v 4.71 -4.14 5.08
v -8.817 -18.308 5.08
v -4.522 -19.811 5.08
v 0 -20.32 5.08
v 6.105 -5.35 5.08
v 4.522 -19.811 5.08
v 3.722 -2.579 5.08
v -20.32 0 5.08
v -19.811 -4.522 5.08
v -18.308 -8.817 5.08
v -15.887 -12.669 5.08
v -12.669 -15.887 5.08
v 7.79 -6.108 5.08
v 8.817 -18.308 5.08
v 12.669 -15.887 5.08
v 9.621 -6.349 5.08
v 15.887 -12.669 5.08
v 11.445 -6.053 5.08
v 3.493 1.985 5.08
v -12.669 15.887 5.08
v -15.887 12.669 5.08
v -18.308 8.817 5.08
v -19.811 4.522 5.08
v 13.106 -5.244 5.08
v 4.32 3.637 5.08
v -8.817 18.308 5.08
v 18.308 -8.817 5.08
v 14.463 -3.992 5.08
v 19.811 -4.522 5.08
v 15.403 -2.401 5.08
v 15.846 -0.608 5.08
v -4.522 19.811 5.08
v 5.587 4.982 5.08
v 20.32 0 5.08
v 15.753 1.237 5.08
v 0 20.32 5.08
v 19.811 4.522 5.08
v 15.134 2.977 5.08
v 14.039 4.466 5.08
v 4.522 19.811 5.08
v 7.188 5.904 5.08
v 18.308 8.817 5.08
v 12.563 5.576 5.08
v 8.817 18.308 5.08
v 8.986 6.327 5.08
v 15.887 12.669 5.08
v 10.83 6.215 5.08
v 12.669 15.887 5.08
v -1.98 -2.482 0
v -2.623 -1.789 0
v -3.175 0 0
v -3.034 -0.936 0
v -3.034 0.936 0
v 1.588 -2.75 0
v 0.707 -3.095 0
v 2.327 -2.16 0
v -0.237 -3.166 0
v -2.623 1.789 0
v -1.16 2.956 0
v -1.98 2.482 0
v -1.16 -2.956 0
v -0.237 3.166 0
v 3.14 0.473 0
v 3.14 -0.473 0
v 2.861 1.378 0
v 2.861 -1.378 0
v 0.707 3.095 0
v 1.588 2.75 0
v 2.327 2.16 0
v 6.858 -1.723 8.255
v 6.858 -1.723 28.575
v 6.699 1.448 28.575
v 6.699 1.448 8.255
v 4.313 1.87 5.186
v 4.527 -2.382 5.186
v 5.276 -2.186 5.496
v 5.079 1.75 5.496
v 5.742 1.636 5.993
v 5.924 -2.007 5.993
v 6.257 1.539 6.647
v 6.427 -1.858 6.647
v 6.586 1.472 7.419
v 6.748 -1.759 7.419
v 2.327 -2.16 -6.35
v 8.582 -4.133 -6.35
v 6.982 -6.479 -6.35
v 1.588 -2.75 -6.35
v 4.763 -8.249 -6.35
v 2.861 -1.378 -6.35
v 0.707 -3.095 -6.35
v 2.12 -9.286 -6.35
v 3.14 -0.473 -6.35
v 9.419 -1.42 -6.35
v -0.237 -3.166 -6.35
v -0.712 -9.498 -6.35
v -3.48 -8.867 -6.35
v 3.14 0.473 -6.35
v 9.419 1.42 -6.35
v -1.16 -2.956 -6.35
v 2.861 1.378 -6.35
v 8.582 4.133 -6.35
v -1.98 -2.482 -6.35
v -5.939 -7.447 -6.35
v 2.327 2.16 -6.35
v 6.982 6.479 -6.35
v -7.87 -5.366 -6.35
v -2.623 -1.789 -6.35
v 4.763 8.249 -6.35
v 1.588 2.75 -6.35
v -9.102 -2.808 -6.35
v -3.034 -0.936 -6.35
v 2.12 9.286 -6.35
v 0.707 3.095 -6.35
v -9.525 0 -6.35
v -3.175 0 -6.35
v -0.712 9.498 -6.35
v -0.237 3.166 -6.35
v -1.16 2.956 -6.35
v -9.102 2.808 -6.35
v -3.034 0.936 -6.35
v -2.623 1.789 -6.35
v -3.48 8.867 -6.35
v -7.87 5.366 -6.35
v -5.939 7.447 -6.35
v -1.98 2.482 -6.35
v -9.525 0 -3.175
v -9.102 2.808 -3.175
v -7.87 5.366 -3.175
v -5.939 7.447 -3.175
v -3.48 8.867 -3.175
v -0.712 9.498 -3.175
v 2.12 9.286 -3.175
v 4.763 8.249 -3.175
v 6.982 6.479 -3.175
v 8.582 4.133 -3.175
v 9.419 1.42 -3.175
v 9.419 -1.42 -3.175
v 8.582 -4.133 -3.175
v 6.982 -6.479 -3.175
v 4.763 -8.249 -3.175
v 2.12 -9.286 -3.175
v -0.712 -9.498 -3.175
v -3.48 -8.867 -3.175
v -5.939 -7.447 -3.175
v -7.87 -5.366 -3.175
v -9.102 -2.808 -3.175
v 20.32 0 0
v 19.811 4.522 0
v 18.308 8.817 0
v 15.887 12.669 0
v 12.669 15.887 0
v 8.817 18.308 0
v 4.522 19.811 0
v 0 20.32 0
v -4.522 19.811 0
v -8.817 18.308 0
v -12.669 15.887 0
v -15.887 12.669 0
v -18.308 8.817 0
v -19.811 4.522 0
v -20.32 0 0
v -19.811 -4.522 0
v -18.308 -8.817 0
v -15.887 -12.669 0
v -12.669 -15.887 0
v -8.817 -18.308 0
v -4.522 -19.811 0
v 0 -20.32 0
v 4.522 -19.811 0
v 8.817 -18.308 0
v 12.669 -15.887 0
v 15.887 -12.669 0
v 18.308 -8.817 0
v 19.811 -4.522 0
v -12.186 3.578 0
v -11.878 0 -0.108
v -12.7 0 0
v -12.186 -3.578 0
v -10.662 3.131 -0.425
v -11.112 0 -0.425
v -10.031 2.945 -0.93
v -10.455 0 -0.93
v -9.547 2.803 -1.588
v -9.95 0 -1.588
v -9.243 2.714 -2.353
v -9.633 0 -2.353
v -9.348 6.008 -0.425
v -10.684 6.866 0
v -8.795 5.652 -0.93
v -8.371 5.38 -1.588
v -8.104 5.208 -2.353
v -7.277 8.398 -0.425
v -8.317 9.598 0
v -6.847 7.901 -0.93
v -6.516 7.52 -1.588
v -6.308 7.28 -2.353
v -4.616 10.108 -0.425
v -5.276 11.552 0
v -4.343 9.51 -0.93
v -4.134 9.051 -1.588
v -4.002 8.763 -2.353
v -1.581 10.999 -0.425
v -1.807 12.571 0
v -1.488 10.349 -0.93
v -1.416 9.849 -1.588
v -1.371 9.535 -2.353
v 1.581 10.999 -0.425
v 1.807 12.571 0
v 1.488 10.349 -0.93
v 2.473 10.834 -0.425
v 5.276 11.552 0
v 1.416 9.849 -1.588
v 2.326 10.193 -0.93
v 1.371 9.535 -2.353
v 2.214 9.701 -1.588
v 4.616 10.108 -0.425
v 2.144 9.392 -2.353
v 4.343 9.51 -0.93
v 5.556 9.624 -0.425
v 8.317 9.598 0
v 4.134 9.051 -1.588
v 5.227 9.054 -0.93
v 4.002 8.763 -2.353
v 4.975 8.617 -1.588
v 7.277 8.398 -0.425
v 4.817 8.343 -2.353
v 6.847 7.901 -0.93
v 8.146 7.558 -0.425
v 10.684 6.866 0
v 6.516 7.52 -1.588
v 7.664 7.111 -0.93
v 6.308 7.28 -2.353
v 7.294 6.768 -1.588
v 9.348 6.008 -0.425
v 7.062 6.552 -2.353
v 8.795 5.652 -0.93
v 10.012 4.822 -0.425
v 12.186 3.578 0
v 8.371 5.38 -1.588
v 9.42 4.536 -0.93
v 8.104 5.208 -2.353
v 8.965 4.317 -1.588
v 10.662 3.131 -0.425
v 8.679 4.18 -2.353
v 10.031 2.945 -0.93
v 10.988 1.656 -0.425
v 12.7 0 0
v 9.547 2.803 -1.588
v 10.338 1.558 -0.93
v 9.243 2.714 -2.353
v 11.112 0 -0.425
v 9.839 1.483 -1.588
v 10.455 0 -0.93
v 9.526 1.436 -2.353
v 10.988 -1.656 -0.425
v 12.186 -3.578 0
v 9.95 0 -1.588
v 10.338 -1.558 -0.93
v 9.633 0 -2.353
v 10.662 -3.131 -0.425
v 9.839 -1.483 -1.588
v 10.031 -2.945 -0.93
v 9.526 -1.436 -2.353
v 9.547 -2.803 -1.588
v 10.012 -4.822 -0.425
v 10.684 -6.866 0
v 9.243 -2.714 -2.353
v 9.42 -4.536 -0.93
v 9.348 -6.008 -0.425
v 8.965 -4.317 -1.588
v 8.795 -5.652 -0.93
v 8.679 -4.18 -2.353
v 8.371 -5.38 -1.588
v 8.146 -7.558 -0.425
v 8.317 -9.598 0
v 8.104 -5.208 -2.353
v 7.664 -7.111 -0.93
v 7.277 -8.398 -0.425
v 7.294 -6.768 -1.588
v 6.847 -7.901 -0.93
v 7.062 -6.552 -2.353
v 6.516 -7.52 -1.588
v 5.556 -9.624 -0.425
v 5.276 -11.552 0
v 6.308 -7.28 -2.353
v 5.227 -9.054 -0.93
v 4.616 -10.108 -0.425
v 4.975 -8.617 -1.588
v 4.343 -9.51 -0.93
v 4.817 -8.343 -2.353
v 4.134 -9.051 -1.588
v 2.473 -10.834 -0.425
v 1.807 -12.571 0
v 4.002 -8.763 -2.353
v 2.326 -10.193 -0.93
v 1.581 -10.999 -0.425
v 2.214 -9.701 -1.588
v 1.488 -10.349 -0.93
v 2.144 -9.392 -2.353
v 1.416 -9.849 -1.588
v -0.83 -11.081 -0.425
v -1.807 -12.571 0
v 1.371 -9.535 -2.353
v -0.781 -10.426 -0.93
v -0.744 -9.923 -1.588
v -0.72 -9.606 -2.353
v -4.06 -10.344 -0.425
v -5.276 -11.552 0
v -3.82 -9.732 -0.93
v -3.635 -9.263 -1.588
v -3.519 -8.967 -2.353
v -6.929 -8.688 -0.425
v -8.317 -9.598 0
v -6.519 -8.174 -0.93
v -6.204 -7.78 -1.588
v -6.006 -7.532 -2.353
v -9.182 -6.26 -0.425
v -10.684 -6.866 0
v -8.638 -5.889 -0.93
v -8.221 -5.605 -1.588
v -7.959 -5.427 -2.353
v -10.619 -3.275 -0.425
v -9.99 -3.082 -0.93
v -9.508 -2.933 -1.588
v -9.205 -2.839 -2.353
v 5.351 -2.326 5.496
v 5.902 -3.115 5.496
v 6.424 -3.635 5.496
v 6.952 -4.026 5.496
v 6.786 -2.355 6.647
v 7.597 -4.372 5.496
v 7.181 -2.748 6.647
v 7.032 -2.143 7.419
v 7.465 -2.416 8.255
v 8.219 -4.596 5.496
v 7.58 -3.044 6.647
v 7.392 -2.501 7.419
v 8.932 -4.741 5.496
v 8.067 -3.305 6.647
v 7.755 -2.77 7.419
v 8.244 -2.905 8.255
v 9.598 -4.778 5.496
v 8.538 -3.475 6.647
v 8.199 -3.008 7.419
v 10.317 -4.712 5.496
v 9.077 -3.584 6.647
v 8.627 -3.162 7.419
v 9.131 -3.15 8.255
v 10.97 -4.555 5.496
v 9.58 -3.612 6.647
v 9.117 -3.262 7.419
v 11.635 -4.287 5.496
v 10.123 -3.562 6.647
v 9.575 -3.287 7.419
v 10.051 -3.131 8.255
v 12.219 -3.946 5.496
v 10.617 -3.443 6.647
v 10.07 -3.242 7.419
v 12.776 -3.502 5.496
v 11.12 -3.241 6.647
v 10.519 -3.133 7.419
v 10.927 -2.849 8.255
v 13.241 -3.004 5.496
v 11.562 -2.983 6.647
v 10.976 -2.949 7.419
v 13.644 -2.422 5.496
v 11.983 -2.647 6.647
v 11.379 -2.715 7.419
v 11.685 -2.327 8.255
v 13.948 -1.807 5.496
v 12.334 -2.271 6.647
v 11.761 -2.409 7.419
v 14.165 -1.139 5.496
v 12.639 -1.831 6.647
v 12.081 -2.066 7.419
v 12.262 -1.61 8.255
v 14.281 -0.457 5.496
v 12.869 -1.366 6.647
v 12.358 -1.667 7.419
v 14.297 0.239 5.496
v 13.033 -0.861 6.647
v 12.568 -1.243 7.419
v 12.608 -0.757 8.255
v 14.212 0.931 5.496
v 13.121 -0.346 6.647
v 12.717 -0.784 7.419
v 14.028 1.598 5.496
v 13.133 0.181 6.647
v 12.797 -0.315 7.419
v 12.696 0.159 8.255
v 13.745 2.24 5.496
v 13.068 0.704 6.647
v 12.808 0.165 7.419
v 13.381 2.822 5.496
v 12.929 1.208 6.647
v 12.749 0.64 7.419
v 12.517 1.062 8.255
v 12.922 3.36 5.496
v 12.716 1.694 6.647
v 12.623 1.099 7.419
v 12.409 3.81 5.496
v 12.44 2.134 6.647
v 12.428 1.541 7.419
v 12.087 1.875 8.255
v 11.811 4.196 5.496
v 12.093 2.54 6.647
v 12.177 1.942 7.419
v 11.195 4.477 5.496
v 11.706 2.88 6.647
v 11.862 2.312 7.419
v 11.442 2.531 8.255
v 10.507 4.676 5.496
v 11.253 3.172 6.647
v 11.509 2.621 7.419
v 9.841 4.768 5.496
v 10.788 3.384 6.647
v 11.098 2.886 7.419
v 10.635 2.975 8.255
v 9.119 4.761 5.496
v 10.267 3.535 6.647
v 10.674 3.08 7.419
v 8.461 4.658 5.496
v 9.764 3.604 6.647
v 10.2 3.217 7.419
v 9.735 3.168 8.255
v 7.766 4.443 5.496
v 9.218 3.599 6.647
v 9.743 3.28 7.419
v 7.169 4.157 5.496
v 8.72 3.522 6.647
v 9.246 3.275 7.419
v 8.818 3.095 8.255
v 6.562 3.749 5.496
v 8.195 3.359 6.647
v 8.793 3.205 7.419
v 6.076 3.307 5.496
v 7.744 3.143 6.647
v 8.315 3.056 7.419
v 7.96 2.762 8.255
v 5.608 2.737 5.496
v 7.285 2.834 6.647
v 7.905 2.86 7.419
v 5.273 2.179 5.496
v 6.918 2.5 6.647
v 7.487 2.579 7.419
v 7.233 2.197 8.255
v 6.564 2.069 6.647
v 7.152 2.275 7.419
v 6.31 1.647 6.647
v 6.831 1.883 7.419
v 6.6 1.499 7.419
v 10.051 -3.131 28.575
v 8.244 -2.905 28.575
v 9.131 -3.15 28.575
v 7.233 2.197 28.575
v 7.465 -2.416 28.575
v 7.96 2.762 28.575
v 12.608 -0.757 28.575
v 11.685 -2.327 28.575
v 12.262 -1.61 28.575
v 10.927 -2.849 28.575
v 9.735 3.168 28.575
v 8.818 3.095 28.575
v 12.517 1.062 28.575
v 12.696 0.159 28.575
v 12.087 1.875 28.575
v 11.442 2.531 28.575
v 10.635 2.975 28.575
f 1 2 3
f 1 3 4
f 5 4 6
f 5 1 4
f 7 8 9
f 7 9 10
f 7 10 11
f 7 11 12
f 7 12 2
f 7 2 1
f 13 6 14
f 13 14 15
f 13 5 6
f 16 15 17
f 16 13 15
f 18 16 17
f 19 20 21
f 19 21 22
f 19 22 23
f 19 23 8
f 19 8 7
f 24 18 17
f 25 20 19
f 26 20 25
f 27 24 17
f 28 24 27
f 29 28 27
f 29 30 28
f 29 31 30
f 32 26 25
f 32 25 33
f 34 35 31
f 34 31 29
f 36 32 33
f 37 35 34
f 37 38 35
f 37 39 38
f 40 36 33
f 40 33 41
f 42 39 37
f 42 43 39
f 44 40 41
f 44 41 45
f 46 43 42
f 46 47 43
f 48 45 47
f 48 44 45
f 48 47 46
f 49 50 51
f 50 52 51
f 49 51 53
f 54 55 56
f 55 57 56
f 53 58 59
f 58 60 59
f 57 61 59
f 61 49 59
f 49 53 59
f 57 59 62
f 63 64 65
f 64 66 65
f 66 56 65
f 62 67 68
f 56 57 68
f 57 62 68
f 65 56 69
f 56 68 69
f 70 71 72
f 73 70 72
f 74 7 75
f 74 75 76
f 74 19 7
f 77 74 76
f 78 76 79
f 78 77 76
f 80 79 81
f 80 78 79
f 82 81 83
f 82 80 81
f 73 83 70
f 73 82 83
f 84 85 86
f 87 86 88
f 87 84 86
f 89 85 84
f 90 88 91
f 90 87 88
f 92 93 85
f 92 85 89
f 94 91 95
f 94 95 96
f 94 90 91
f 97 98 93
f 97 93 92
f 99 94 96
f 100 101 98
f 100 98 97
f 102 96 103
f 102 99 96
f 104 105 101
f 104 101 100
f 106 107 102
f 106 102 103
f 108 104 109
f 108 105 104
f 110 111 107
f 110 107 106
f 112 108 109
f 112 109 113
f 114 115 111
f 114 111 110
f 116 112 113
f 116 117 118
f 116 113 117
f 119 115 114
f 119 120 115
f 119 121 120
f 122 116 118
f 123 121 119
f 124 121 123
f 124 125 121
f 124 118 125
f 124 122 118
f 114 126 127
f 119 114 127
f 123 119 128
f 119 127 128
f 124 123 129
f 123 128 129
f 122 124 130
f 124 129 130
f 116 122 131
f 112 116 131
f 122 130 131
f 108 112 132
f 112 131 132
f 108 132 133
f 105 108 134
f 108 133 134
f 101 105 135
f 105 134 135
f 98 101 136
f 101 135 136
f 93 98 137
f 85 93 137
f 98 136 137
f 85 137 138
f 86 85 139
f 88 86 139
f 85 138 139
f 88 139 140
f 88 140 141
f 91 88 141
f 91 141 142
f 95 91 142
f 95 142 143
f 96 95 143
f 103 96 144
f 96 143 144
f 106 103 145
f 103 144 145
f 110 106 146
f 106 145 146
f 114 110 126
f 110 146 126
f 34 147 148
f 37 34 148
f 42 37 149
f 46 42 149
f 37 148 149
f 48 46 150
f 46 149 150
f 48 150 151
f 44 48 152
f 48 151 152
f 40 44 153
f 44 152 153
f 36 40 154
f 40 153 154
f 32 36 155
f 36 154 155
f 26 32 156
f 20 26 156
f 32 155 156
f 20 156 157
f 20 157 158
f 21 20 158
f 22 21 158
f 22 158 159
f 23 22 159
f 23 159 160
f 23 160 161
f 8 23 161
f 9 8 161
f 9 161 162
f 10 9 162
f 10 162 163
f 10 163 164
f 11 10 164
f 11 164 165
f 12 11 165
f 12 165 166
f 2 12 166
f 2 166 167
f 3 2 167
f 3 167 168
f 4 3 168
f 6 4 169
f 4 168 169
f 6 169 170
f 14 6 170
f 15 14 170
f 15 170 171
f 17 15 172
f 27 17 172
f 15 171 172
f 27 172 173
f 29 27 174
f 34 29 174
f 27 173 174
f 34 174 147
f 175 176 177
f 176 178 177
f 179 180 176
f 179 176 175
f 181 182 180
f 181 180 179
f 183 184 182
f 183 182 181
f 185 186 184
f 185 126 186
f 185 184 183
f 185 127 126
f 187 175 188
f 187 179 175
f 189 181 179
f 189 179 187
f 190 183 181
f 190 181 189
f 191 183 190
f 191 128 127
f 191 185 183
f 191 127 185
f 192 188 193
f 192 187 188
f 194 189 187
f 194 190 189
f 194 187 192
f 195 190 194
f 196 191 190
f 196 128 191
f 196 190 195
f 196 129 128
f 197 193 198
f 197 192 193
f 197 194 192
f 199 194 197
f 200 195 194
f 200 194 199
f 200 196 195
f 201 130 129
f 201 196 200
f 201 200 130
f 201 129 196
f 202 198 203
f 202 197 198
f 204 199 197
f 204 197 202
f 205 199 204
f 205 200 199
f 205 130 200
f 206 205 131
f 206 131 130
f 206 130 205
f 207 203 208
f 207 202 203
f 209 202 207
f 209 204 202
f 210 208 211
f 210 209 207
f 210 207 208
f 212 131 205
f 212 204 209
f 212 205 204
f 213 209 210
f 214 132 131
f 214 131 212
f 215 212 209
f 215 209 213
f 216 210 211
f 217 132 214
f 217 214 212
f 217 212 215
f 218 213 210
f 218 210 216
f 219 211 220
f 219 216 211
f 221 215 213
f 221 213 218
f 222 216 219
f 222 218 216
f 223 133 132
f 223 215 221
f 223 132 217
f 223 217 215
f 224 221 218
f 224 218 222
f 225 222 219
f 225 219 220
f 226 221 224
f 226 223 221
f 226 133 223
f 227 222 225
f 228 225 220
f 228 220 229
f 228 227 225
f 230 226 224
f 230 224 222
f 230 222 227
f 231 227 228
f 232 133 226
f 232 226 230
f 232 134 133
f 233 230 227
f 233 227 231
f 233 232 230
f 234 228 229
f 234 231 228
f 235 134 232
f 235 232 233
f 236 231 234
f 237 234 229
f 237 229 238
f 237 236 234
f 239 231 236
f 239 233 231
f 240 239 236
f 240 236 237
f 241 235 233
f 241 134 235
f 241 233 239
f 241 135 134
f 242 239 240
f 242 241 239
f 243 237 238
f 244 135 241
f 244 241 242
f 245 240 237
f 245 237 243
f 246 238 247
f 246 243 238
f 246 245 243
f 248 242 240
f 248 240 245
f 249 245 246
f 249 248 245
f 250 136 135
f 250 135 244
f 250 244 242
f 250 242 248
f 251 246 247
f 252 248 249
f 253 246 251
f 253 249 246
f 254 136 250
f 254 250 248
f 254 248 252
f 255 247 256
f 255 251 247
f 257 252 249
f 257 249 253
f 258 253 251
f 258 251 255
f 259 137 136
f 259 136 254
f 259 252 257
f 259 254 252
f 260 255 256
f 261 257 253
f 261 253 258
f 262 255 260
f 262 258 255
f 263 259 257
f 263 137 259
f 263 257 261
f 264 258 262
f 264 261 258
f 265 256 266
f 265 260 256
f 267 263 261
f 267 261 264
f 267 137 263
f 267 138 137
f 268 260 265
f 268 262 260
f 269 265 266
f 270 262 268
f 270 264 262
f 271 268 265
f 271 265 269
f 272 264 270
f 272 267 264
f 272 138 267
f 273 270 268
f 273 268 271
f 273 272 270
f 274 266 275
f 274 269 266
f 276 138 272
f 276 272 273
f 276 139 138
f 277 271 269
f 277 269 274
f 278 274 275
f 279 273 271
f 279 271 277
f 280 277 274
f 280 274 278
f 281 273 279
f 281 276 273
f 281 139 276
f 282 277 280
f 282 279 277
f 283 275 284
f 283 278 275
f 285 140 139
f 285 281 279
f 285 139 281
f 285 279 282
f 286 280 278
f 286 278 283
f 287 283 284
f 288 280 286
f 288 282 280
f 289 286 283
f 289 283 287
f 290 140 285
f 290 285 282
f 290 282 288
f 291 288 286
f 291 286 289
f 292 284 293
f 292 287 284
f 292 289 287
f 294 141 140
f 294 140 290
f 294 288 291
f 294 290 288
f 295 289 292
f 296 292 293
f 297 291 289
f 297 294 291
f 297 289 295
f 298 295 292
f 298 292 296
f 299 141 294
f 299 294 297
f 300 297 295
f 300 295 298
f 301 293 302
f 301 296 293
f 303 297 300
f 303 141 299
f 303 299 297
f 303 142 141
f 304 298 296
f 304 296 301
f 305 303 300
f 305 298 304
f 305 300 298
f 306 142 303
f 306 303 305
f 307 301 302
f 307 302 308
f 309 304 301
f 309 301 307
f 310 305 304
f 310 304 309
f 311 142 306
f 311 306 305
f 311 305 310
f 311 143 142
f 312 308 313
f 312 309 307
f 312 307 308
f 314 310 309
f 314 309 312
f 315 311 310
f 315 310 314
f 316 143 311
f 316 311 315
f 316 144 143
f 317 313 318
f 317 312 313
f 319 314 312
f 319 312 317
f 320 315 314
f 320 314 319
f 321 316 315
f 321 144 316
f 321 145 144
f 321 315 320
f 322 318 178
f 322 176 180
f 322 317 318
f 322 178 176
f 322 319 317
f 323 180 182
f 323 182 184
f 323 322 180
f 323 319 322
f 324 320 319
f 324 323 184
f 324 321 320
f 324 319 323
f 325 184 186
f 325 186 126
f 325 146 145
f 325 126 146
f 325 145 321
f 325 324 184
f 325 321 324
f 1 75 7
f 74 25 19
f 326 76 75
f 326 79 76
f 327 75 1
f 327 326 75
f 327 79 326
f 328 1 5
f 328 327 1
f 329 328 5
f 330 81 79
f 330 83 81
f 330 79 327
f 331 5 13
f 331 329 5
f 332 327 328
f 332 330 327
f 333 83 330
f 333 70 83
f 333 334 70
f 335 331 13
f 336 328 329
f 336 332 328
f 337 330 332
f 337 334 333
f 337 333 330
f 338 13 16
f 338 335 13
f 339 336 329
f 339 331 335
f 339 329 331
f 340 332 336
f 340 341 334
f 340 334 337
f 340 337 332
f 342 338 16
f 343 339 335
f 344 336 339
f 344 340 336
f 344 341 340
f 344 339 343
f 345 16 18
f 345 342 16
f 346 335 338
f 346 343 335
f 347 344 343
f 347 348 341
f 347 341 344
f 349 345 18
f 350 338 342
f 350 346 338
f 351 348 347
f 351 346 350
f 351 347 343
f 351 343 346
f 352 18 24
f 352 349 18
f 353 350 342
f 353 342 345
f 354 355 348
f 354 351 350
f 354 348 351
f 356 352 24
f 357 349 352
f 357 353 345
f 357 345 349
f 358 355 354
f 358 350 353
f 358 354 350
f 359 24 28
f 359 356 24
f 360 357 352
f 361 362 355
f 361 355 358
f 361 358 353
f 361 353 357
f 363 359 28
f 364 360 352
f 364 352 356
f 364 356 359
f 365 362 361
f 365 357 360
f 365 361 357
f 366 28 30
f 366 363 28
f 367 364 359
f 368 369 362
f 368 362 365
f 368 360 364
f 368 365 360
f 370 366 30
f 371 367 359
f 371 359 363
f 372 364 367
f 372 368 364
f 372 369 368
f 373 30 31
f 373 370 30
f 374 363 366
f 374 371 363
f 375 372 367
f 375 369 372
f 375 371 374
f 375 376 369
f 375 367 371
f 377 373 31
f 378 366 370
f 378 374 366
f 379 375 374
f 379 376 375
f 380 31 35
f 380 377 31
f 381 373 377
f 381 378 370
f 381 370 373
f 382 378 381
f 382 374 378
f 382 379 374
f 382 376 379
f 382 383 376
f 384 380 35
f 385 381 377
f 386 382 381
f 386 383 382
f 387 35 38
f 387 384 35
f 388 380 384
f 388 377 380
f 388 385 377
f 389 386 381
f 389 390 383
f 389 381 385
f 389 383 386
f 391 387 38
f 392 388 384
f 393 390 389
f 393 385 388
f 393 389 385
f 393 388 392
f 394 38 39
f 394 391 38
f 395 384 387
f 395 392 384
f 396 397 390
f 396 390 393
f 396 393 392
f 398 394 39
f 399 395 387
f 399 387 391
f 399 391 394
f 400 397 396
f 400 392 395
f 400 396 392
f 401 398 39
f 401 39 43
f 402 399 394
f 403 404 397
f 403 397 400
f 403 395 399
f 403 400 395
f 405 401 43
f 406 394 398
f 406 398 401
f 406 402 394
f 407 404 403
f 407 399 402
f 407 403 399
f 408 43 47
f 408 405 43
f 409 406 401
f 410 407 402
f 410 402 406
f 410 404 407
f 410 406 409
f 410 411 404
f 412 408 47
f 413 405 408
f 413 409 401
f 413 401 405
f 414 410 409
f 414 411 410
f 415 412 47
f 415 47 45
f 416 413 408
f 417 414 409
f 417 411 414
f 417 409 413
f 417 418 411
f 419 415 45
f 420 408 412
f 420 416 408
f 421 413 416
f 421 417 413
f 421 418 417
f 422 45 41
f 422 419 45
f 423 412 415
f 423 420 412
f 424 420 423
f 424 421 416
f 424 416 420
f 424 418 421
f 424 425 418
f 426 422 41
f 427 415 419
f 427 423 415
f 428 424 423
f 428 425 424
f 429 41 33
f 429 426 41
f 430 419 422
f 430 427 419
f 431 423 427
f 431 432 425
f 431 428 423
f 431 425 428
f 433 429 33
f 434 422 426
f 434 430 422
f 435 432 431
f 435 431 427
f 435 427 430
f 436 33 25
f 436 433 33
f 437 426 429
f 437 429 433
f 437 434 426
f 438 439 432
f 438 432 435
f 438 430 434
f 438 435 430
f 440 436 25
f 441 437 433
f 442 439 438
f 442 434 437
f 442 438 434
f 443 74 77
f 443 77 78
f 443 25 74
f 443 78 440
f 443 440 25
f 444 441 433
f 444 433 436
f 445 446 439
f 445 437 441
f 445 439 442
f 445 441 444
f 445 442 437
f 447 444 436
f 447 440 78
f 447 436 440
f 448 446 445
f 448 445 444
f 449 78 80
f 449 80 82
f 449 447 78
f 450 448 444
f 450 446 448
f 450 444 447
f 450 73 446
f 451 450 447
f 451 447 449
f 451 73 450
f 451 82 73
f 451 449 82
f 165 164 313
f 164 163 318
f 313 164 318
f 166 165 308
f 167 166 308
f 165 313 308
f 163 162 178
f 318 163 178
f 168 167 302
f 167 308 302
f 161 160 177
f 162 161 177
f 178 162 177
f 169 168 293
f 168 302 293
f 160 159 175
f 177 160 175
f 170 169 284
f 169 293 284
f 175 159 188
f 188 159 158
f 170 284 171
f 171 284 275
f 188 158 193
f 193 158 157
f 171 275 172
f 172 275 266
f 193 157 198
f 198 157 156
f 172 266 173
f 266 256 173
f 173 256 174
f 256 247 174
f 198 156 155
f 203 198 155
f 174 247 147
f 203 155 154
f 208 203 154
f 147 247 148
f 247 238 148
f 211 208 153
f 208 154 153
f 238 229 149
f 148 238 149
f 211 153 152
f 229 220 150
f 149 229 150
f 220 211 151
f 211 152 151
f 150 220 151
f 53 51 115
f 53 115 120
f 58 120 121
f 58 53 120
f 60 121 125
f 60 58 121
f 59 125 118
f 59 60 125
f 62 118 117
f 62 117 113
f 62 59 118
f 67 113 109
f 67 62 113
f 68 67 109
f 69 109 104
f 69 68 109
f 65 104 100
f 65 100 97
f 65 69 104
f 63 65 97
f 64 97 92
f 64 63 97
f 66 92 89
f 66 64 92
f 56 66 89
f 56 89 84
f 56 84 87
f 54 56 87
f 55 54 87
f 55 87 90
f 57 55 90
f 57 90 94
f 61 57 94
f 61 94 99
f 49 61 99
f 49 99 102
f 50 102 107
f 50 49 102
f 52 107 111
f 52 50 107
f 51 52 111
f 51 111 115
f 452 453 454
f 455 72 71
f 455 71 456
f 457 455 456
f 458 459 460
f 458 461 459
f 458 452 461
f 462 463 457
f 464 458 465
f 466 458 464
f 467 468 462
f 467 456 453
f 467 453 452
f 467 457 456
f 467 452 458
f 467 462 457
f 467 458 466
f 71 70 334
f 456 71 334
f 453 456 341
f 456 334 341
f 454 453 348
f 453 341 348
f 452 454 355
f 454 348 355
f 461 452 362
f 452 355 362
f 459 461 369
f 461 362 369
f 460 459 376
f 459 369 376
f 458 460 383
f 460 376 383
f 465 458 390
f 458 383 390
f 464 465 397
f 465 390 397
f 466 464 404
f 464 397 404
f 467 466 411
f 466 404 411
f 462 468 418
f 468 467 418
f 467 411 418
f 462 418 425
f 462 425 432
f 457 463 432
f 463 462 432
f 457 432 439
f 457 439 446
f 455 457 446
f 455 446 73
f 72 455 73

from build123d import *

# Parameters (mm, degrees)
ESQUISSE1_R             = 20.32
ESQUISSE1_R_2           = 3.175
BOSS_EXTRU_1_DEPTH      = 5.08
ESQUISSE2_R             = 3.175
BOSS_EXTRU_2_DEPTH      = 28.575
ENL_V_MAT_EXTRU_1_DEPTH = 23.495
ESQUISSE4_R             = 4.097809842
BOSS_EXTRU_3_DEPTH      = 5.08
ESQUISSE5_R             = 9.525
ESQUISSE5_R_2           = 3.175
BOSS_EXTRU_4_DEPTH      = 6.35
CONG_1_R                = 3.175


with BuildPart() as part:
    # Esquisse1 → Boss.-Extru.1 (new body)
    with BuildSketch(Plane.XY):
        Circle(ESQUISSE1_R)
        with Locations((9.525, 0)):
            Circle(ESQUISSE1_R_2, mode=Mode.SUBTRACT)
        Circle(ESQUISSE1_R_2, mode=Mode.SUBTRACT)
    extrude(amount=BOSS_EXTRU_1_DEPTH)

    # Esquisse2 → Boss.-Extru.2 (add)
    with BuildSketch(Plane.XY):
        with Locations((9.525, 0)):
            Circle(ESQUISSE2_R)
    extrude(amount=BOSS_EXTRU_2_DEPTH)

    # Esquisse3 → Enlèv. mat.-Extru.1 (cut)
    with BuildSketch(Plane.XY.offset(28.575)):
        Polygon((10.863482677, -81.610355532), (6.858308609, -1.723189492), (6.699328429, 1.447827743), (2.694154361, 81.334993784), (-157.08017772, 73.324645646), (-148.910849404, -89.620703669), align=None)
    extrude(amount=-ENL_V_MAT_EXTRU_1_DEPTH, mode=Mode.SUBTRACT)

    # Esquisse4 → Boss.-Extru.3 (add)
    with BuildSketch(Plane.XY.offset(5.08)):
        Circle(ESQUISSE4_R)
    extrude(amount=-BOSS_EXTRU_3_DEPTH)

    # Esquisse5 → Boss.-Extru.4 (add)
    with BuildSketch(Plane(origin=(0, 0, 0), x_dir=(-1, 0, 0), z_dir=(0, 0, -1))):
        Circle(ESQUISSE5_R)
        Circle(ESQUISSE5_R_2, mode=Mode.SUBTRACT)
    extrude(amount=BOSS_EXTRU_4_DEPTH)

    # Congé1
    cong_1_edges = [part.edges().sort_by_distance(p)[0] for p in [
        (12.696017235, 0.15898018, 5.08),
        (6.778818519, -0.137680874, 5.08),
        (9.525, 0, 0),
    ]]
    fillet(cong_1_edges, radius=CONG_1_R)


solid = part.part
